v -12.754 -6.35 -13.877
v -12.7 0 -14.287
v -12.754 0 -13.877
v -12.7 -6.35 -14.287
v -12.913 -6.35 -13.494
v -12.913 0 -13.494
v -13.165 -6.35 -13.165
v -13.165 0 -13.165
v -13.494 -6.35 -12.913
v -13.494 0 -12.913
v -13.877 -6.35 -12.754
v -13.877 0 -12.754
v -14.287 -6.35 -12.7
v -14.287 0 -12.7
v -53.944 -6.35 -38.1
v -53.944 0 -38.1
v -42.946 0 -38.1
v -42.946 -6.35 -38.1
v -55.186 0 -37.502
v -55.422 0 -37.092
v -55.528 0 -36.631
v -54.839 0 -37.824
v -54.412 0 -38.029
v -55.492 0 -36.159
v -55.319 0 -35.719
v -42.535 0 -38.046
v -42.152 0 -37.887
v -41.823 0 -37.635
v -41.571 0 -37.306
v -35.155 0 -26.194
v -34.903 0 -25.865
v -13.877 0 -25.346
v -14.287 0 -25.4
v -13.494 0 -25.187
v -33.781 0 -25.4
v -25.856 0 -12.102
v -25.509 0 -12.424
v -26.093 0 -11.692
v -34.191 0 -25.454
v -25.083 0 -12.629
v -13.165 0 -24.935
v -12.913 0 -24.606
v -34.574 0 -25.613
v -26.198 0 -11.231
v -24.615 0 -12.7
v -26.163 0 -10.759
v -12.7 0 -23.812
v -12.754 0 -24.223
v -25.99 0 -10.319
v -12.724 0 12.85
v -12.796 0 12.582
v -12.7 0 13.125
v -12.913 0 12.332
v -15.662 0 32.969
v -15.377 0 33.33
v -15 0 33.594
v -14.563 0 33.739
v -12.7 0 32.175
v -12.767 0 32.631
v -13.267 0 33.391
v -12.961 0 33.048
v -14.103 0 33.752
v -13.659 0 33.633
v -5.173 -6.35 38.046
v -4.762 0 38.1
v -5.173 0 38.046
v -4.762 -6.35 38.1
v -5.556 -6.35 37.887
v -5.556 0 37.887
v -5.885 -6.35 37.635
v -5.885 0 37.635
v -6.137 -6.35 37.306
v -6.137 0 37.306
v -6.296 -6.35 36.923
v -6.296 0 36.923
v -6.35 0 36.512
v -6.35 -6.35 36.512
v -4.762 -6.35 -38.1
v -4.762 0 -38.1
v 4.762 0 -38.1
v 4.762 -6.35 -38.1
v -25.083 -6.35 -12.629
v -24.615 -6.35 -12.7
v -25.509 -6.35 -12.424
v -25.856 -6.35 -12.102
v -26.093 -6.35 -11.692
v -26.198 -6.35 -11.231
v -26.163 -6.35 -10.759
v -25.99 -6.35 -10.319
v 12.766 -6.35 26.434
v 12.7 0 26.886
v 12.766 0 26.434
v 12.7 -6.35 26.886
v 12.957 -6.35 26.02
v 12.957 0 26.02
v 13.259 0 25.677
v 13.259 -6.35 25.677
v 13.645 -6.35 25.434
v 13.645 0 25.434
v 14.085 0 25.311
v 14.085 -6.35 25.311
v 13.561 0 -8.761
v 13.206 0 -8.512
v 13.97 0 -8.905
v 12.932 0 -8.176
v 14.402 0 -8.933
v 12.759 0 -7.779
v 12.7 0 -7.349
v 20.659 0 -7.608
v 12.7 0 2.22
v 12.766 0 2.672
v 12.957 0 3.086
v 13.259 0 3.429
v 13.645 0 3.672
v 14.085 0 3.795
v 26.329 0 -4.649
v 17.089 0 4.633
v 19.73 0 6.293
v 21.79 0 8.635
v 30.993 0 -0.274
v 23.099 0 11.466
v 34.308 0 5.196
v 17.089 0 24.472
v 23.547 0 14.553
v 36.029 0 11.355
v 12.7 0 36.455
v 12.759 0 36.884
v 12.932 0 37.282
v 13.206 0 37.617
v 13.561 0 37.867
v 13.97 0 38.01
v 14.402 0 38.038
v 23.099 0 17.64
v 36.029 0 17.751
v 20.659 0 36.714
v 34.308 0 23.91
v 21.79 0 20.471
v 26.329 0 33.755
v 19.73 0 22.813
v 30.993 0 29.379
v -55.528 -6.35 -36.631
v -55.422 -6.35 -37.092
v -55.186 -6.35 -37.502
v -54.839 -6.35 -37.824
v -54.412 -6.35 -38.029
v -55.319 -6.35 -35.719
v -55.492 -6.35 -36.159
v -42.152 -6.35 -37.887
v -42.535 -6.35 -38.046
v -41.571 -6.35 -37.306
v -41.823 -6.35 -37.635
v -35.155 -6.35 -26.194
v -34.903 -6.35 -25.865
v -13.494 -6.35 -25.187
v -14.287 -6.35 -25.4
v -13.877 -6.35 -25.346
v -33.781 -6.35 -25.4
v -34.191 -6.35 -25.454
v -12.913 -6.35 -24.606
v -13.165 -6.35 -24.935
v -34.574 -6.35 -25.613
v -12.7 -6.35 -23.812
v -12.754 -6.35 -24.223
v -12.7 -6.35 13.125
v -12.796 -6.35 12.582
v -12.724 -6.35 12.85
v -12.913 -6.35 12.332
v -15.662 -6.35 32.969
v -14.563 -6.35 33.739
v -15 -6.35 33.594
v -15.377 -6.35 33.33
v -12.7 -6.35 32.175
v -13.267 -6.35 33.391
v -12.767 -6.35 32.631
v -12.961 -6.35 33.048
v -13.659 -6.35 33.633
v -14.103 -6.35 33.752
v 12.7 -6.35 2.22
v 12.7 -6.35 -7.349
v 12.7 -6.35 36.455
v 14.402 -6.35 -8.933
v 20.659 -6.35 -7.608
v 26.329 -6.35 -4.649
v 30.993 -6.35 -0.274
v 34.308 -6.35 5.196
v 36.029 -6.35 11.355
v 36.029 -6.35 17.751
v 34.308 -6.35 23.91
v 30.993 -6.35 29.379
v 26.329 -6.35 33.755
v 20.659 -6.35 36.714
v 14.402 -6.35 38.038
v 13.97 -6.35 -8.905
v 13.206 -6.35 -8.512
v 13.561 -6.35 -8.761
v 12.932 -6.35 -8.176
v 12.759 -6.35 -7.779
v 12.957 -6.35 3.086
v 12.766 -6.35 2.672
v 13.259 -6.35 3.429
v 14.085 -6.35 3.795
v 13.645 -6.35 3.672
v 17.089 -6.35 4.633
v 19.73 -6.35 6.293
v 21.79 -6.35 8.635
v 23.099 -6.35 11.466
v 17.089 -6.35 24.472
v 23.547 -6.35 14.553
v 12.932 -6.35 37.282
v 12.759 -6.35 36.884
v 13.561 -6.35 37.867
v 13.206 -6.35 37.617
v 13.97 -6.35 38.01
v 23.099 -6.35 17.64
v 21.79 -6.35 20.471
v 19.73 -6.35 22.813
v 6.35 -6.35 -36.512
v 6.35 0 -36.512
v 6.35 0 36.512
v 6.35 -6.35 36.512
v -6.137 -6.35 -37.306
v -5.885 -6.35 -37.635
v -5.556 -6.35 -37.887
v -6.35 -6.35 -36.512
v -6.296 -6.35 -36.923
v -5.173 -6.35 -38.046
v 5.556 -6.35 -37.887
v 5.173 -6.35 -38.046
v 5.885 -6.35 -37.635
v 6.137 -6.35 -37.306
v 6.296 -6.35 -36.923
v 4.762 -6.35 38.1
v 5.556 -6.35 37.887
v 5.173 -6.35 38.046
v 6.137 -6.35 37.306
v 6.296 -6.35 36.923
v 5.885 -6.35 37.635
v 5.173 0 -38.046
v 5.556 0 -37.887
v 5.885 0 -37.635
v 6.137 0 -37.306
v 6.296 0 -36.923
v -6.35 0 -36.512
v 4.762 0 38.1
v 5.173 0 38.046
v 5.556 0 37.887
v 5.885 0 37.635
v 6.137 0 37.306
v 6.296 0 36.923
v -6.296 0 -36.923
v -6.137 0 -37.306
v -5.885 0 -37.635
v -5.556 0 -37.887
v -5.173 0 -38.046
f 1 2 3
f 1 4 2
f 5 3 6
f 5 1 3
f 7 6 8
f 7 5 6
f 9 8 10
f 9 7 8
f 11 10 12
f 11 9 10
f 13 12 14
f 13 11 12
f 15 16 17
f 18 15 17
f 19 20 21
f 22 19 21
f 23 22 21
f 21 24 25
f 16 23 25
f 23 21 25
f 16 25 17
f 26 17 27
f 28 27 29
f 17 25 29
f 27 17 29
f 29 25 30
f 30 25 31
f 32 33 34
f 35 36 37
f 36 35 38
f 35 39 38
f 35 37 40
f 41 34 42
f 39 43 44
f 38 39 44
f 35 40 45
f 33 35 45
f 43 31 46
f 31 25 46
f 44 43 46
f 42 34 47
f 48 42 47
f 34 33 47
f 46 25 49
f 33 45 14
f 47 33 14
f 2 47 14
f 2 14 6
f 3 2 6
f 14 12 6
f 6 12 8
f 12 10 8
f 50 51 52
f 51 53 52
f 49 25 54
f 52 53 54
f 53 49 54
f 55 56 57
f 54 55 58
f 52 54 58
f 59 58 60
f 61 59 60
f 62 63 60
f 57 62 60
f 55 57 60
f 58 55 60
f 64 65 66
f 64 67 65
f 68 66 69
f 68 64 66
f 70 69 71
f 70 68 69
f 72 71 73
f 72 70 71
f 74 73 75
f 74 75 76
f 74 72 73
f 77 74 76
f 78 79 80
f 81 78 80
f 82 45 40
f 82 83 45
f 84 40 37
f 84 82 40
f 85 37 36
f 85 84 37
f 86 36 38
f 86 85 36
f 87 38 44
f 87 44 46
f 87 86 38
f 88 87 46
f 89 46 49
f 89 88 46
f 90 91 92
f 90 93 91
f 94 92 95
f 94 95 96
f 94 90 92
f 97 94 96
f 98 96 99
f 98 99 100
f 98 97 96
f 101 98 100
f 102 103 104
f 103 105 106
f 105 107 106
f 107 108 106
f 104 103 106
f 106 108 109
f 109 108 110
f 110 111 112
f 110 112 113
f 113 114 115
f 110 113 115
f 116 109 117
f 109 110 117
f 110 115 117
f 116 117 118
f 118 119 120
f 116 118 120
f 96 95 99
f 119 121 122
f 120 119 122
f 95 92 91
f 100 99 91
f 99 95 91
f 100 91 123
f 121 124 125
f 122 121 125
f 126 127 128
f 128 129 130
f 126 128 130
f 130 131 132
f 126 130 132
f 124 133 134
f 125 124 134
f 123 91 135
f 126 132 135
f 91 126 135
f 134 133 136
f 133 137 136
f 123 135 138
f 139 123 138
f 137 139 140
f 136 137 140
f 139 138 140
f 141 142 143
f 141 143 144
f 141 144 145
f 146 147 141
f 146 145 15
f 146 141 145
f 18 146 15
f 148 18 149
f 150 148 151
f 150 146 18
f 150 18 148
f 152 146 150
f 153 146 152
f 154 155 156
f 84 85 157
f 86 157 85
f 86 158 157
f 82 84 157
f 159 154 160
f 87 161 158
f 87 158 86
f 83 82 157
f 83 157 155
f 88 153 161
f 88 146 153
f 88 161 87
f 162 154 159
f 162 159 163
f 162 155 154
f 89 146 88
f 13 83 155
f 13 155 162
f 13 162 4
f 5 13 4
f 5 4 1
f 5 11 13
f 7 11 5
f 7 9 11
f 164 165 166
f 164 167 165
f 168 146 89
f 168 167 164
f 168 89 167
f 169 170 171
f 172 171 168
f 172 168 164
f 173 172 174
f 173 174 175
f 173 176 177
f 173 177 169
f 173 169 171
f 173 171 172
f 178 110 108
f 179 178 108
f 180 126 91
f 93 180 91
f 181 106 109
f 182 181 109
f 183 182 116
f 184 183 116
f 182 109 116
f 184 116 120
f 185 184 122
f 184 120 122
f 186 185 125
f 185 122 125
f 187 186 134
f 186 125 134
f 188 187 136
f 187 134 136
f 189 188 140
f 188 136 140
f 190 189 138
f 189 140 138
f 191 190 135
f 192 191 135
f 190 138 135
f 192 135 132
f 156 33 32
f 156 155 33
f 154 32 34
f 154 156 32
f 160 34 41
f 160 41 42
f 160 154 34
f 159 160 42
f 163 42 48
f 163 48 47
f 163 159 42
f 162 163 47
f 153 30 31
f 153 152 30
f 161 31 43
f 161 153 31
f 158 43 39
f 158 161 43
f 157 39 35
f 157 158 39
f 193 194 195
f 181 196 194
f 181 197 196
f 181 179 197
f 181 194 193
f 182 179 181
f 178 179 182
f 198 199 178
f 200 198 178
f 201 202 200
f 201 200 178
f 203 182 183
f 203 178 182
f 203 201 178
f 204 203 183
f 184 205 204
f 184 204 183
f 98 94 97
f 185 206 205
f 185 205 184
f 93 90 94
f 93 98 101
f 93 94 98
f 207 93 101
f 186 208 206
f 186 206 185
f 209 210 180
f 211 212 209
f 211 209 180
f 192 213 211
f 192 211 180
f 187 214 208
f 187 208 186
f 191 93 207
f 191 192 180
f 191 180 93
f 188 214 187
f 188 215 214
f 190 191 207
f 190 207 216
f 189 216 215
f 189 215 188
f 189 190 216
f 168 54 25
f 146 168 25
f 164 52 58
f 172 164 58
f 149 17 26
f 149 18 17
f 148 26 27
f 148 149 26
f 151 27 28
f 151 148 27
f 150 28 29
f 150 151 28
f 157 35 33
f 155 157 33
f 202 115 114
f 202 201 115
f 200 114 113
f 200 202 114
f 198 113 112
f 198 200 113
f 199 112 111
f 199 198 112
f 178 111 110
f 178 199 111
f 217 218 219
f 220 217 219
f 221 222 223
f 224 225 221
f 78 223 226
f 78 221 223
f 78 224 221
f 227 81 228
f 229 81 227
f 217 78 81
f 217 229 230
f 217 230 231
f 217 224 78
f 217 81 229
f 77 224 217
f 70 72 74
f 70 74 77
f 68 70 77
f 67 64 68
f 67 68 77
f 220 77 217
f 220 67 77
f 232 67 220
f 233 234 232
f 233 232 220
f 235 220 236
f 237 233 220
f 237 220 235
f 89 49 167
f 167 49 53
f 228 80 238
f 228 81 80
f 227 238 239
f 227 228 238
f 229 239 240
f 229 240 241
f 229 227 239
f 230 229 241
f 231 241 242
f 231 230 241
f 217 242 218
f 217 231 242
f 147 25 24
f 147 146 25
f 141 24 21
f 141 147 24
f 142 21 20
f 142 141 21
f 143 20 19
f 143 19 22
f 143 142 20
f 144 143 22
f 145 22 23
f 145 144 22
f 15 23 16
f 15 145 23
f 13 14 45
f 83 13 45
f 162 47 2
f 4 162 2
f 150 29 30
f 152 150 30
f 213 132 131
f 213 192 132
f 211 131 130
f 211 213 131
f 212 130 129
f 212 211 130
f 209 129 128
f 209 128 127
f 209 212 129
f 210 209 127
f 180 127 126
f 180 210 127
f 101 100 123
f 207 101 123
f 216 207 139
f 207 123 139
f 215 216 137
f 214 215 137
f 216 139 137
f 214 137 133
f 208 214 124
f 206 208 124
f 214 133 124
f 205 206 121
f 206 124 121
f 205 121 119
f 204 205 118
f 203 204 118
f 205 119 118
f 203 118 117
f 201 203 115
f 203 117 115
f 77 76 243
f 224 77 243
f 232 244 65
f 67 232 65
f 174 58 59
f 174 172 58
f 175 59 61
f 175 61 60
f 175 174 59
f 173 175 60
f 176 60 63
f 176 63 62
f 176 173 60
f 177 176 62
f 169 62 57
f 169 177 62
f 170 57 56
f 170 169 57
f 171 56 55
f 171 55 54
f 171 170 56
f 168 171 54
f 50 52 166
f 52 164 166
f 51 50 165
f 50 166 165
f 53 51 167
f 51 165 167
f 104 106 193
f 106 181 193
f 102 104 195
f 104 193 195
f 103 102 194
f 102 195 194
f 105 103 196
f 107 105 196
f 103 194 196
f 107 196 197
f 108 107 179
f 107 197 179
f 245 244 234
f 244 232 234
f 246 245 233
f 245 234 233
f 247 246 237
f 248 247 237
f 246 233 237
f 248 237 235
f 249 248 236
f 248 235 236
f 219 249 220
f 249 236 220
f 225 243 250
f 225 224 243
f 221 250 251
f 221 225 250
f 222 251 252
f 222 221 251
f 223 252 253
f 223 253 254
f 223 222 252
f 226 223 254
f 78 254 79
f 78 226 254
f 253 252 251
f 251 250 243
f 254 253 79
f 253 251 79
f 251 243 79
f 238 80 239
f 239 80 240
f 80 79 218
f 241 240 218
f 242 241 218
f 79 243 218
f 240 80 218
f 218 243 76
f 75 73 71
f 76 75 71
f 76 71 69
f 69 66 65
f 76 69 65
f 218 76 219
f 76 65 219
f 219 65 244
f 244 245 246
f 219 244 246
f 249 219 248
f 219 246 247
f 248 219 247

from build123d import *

# Parameters (mm, degrees)
F2_DEPTH = 6.35
F3_R     = 1.5875
F3_2_R   = 1.5875
F3_3_R   = 1.5875


# Not quite as in the source:
# - a variable given as a bare number and used for a length is read in inches; the dataset says mm whatever the document's units were


with BuildPart() as f2:
    # F1 (on Front) → F2 (new body)
    with BuildSketch(Plane.XZ):
        Polygon((-12.7, 12.7), (-12.7, 38.1), (-56.6940905122, -38.1), (-42.0293936748, -38.1), (-34.6970452561, -25.4), (-27.3646968374, -12.7), align=None)
        Polygon((-12.7, -25.4), (-12.7, -12.7), (-27.3646968374, -12.7), (-34.6970452561, -25.4), align=None)
    extrude(amount=F2_DEPTH)

    # F3
    f3_edges = [f2.edges().sort_by_distance(p)[0] for p in [
        (-12.7, -3.175, 38.1),
        (-12.7, -3.175, 12.7),
        (-12.7, -3.175, -25.4),
        (-34.697045, -3.175, -25.4),
        (-42.029394, -3.175, -38.1),
        (-56.694091, -3.175, -38.1),
        (-27.364697, -3.175, -12.7),
        (-12.7, -3.175, -12.7),
    ]]
    fillet(f3_edges, radius=F3_R)


with BuildPart() as f2b:
    # F1 (on Front) → F2, piece 2 (new body)
    with BuildSketch(Plane.XZ):
        Polygon((6.35, 38.1), (-6.35, 38.1), (-6.35, 12.7), (-6.35, -12.7), (-6.35, -25.4), (-6.35, -38.1), (6.35, -38.1), (6.35, -8.9941899428), (6.35, 3.7058100572), (6.35, 25.4), align=None)
    extrude(amount=F2_DEPTH)

    # F3#2
    f3_2_edges = [f2b.edges().sort_by_distance(p)[0] for p in [
        (-6.35, -3.175, 38.1),
        (6.35, -3.175, 38.1),
        (-6.35, -3.175, -38.1),
        (6.35, -3.175, -38.1),
    ]]
    fillet(f3_2_edges, radius=F3_2_R)


with BuildPart() as f2c:
    # F1 (on Front) → F2, piece 3 (new body)
    with BuildSketch(Plane.XZ):
        with BuildLine():
            ThreePointArc((12.7, -8.9941899428), (36.2470949714, 14.5529050286), (12.7, 38.1))
            Line((12.7, 38.1), (12.7, 25.4))
            ThreePointArc((12.7, 25.4), (23.5470949714, 14.5529050286), (12.7, 3.7058100572))
            Line((12.7, 3.7058100573), (12.7, -8.9941899428))
        make_face()
    extrude(amount=F2_DEPTH)

    # F3#3
    f3_3_edges = [f2c.edges().sort_by_distance(p)[0] for p in [
        (12.7, -3.175, -8.99419),
        (12.7, -3.175, 3.70581),
        (12.7, -3.175, 25.4),
        (12.7, -3.175, 38.1),
    ]]
    fillet(f3_3_edges, radius=F3_3_R)


solid = Compound([f2.part, f2b.part, f2c.part])
